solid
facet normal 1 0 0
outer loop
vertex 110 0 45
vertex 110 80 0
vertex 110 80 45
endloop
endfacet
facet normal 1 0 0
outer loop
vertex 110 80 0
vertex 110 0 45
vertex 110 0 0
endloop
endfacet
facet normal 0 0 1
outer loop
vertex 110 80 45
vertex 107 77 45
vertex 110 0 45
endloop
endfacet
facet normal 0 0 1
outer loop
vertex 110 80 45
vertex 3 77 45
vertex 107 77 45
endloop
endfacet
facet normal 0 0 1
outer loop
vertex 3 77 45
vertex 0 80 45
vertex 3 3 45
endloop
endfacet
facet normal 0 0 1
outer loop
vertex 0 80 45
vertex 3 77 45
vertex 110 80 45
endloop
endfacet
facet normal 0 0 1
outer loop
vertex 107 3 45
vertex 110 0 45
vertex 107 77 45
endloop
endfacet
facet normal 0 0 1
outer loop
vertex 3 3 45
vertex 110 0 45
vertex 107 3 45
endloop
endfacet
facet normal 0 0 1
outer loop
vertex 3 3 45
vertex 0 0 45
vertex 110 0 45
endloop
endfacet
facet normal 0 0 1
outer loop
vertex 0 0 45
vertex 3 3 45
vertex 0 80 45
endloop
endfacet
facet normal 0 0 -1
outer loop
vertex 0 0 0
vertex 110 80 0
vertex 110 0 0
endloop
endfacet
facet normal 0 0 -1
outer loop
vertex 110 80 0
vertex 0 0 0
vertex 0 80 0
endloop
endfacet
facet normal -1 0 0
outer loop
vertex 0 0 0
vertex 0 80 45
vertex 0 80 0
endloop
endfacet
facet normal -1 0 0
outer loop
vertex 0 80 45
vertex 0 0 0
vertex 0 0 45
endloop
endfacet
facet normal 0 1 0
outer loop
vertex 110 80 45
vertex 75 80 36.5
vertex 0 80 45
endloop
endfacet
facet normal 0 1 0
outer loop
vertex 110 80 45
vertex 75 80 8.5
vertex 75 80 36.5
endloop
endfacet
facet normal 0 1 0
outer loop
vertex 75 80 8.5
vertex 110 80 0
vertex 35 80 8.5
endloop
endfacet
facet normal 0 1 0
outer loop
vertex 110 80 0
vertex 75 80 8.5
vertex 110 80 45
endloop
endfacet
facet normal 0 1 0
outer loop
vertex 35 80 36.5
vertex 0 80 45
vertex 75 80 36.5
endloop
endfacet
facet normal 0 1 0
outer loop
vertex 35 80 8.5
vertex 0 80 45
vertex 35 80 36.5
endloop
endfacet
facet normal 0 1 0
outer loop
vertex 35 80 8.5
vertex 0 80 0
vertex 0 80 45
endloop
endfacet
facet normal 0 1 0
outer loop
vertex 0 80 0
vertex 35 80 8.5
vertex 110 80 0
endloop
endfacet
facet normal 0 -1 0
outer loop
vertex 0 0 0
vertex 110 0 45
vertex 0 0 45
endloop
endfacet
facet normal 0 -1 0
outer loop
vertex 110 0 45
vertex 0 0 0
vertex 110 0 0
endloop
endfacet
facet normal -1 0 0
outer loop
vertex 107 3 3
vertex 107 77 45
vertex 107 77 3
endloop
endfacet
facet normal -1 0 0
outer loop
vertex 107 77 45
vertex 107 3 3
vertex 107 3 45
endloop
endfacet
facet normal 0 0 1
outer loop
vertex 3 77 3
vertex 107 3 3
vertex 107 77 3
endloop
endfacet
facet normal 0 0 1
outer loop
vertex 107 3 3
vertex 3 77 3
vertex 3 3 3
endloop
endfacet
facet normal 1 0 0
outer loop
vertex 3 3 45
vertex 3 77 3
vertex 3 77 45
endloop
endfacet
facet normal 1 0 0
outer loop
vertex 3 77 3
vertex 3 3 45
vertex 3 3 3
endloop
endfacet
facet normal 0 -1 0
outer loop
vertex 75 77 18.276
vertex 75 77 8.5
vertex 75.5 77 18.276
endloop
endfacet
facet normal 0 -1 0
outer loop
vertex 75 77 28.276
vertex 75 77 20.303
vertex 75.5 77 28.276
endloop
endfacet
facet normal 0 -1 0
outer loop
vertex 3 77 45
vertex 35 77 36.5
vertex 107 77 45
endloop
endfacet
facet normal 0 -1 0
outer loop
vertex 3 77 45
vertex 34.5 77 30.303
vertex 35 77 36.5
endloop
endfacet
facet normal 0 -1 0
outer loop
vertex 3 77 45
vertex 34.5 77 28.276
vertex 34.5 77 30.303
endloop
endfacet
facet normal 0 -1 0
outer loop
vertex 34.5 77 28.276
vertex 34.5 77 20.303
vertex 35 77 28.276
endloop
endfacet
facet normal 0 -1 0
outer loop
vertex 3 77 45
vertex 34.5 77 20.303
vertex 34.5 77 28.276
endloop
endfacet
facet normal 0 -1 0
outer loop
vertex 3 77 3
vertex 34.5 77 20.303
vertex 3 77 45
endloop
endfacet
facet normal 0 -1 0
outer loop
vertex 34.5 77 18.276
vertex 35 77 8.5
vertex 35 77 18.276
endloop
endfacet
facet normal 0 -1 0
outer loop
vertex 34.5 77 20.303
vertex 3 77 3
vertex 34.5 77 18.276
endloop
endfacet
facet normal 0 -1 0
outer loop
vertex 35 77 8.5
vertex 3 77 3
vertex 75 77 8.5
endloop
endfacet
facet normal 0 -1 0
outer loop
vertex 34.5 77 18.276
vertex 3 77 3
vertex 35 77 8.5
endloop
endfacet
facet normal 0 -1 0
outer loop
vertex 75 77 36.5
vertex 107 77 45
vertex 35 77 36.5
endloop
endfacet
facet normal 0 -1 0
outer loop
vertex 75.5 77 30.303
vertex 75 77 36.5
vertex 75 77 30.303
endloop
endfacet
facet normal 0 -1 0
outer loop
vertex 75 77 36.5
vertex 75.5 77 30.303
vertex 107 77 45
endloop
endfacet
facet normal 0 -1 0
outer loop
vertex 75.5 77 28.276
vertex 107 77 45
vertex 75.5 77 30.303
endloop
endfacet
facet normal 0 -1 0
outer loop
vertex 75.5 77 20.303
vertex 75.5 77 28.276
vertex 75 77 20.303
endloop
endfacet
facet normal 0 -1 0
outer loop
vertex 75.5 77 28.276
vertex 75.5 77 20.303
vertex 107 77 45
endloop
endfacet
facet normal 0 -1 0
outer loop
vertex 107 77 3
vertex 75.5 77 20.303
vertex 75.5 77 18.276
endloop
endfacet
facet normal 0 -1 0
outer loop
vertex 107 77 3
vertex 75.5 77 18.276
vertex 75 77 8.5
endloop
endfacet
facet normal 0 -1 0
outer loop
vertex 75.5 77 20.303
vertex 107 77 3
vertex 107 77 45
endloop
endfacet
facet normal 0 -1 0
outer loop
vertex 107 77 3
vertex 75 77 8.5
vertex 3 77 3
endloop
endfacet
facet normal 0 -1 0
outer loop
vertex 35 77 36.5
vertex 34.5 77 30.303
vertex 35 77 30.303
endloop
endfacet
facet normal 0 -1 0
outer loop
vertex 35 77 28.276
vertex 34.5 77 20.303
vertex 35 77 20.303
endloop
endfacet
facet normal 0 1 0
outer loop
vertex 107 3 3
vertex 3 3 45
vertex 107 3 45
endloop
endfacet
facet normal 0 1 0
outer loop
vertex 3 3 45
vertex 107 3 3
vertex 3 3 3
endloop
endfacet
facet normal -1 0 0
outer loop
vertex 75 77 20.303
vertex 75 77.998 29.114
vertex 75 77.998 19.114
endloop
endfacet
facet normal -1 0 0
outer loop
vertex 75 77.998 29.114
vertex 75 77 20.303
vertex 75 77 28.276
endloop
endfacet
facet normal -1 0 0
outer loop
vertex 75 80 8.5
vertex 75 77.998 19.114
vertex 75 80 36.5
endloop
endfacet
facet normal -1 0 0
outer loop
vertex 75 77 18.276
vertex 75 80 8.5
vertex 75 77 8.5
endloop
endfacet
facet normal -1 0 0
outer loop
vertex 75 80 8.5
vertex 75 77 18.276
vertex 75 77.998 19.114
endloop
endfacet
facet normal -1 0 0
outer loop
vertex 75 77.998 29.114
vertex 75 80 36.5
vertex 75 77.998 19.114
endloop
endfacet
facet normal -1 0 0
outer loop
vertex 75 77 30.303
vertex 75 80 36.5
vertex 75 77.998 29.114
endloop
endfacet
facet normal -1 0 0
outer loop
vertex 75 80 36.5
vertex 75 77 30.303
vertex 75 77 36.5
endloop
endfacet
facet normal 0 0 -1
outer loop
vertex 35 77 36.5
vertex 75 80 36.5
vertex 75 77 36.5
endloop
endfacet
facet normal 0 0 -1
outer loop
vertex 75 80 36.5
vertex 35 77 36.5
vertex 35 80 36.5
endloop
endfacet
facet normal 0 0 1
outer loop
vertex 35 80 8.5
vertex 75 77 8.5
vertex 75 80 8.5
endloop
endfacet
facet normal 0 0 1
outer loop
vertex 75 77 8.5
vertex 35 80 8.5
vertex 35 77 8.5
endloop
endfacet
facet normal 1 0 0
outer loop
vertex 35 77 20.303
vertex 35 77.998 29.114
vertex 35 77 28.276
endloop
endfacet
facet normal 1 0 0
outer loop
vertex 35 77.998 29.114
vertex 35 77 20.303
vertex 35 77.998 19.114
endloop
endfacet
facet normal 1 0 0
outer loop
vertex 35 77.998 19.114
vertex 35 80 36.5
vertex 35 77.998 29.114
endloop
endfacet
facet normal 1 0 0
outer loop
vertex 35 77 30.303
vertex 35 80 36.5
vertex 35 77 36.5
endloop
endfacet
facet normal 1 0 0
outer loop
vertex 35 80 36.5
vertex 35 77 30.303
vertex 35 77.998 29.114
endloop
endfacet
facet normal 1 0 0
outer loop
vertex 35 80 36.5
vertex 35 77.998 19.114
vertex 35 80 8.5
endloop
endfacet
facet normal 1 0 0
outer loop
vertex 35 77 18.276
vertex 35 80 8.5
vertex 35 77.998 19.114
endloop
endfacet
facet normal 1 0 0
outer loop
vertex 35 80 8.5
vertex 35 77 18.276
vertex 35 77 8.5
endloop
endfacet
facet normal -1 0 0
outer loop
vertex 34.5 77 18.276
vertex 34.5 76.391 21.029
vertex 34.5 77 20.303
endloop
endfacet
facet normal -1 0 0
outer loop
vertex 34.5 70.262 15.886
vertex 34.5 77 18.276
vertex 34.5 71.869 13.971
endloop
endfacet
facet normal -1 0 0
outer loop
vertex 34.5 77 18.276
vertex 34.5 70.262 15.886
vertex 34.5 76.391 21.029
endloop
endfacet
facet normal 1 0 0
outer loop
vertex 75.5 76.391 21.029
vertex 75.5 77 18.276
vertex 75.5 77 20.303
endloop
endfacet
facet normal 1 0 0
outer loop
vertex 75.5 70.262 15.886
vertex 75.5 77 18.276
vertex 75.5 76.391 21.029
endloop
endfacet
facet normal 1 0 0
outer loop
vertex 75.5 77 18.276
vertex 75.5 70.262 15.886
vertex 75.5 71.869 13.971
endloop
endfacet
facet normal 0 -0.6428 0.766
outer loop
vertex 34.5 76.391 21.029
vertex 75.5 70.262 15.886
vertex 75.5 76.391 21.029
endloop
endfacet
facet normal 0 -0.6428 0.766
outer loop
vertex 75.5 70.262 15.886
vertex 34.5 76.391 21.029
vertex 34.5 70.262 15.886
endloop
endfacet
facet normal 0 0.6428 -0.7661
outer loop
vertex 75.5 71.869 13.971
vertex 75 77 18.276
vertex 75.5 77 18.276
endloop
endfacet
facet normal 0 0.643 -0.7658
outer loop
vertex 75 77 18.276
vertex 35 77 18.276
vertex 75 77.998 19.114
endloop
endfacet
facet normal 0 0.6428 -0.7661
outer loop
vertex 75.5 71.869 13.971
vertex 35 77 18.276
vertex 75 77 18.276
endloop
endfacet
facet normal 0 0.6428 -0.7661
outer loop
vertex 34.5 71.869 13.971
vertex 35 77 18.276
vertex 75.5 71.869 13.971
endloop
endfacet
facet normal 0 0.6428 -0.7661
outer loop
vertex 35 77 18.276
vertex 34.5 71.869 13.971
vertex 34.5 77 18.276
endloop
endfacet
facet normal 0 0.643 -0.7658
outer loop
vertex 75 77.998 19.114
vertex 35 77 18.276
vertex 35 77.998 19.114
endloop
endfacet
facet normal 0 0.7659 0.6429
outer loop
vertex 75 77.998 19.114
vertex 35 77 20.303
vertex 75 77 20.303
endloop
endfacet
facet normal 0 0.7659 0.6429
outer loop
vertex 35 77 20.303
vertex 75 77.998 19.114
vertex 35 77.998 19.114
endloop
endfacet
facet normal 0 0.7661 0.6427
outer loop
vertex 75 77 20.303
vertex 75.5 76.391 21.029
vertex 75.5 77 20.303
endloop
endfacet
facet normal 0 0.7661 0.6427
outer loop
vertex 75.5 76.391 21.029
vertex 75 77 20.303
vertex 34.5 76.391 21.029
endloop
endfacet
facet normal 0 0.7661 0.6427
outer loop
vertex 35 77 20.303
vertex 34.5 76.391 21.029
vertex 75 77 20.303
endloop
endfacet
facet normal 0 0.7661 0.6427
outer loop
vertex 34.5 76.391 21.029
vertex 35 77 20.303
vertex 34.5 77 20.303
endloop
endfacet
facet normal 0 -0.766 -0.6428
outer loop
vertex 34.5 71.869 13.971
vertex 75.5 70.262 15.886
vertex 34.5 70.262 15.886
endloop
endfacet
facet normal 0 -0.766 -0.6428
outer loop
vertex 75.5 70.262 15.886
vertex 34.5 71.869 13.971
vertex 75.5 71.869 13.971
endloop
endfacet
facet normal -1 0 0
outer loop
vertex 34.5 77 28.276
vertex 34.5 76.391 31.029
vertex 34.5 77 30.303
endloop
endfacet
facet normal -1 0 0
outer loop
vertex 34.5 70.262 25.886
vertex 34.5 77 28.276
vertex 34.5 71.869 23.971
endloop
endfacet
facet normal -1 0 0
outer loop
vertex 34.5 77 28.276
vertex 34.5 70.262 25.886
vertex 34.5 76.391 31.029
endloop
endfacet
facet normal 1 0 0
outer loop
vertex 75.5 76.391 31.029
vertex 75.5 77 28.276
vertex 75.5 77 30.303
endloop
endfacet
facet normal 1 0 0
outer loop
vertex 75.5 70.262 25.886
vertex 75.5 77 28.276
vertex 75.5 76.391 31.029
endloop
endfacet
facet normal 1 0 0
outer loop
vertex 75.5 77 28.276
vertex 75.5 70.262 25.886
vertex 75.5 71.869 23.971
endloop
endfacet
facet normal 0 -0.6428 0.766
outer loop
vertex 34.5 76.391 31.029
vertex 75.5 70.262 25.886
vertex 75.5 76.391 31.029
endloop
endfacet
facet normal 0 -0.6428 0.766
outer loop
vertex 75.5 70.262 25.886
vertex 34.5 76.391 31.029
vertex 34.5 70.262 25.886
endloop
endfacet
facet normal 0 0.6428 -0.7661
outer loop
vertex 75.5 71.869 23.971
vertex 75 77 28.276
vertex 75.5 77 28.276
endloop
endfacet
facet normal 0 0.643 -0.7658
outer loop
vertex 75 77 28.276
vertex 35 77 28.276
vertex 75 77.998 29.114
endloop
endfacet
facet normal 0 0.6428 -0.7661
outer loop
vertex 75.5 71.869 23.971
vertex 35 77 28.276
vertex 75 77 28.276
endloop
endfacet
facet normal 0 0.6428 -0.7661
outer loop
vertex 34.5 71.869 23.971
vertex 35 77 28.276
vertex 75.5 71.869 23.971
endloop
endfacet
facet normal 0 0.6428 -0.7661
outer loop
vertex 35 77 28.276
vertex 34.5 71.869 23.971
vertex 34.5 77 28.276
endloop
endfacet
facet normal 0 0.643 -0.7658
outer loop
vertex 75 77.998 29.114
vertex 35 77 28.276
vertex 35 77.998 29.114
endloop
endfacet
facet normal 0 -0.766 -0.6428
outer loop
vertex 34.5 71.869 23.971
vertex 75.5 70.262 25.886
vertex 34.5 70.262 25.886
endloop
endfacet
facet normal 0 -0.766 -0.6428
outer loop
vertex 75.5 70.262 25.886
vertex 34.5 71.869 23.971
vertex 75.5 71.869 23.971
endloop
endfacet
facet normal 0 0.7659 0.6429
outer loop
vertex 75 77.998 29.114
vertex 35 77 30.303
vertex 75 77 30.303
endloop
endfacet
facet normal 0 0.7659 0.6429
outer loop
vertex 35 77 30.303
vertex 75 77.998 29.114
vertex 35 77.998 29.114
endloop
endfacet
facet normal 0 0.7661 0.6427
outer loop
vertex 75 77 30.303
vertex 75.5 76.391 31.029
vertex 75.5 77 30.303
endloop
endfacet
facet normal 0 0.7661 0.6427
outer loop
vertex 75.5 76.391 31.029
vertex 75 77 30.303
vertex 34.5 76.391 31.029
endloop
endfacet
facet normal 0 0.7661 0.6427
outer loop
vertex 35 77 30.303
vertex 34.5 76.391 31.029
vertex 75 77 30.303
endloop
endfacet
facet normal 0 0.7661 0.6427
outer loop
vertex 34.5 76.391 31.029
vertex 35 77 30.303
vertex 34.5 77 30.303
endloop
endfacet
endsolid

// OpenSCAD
$fn = 32;

// ----------------------------------------------------------------------
// Vent box: louvers enclosure
// ----------------------------------------------------------------------

// --- parameters (mm) ---
box_l = 110;              // box length, X
box_w = 80;               // box width, Y
box_h = 45;               // box height, Z
wall_t = 3;               // shell wall thickness
win_l = 40;               // vent window width, X
win_h = 28;               // vent window height, Z
slat_t = 2.5;             // louver slat thickness
slat_d = 8;               // louver slat depth
slat_a = 40;              // louver slat angle, degrees
slat_pitch = 10;          // louver pitch
slat_yc = 74.13;          // slat centreline Y

win_z0 = (box_h - win_h) / 2;  // window lower edge Z
n_slats = 2;  // louver count
slat_z0 = win_z0 + (win_h - (n_slats - 1) * slat_pitch) / 2;

difference() {
  union() {
    difference() {
      cube([box_l, box_w, box_h]);
  translate([wall_t, wall_t, wall_t])
    cube([box_l - 2 * wall_t, box_w - 2 * wall_t, box_h]);
  translate([(box_l - win_l) / 2, box_w - wall_t - 1, win_z0])
    cube([win_l, wall_t + 2, win_h]);
    }
    for (i = [0 : n_slats - 1])
      translate([box_l / 2, slat_yc, slat_z0 + i * slat_pitch])
        rotate([slat_a, 0, 0])
          cube([win_l + 1, slat_d, slat_t], center = true);
  }
}
